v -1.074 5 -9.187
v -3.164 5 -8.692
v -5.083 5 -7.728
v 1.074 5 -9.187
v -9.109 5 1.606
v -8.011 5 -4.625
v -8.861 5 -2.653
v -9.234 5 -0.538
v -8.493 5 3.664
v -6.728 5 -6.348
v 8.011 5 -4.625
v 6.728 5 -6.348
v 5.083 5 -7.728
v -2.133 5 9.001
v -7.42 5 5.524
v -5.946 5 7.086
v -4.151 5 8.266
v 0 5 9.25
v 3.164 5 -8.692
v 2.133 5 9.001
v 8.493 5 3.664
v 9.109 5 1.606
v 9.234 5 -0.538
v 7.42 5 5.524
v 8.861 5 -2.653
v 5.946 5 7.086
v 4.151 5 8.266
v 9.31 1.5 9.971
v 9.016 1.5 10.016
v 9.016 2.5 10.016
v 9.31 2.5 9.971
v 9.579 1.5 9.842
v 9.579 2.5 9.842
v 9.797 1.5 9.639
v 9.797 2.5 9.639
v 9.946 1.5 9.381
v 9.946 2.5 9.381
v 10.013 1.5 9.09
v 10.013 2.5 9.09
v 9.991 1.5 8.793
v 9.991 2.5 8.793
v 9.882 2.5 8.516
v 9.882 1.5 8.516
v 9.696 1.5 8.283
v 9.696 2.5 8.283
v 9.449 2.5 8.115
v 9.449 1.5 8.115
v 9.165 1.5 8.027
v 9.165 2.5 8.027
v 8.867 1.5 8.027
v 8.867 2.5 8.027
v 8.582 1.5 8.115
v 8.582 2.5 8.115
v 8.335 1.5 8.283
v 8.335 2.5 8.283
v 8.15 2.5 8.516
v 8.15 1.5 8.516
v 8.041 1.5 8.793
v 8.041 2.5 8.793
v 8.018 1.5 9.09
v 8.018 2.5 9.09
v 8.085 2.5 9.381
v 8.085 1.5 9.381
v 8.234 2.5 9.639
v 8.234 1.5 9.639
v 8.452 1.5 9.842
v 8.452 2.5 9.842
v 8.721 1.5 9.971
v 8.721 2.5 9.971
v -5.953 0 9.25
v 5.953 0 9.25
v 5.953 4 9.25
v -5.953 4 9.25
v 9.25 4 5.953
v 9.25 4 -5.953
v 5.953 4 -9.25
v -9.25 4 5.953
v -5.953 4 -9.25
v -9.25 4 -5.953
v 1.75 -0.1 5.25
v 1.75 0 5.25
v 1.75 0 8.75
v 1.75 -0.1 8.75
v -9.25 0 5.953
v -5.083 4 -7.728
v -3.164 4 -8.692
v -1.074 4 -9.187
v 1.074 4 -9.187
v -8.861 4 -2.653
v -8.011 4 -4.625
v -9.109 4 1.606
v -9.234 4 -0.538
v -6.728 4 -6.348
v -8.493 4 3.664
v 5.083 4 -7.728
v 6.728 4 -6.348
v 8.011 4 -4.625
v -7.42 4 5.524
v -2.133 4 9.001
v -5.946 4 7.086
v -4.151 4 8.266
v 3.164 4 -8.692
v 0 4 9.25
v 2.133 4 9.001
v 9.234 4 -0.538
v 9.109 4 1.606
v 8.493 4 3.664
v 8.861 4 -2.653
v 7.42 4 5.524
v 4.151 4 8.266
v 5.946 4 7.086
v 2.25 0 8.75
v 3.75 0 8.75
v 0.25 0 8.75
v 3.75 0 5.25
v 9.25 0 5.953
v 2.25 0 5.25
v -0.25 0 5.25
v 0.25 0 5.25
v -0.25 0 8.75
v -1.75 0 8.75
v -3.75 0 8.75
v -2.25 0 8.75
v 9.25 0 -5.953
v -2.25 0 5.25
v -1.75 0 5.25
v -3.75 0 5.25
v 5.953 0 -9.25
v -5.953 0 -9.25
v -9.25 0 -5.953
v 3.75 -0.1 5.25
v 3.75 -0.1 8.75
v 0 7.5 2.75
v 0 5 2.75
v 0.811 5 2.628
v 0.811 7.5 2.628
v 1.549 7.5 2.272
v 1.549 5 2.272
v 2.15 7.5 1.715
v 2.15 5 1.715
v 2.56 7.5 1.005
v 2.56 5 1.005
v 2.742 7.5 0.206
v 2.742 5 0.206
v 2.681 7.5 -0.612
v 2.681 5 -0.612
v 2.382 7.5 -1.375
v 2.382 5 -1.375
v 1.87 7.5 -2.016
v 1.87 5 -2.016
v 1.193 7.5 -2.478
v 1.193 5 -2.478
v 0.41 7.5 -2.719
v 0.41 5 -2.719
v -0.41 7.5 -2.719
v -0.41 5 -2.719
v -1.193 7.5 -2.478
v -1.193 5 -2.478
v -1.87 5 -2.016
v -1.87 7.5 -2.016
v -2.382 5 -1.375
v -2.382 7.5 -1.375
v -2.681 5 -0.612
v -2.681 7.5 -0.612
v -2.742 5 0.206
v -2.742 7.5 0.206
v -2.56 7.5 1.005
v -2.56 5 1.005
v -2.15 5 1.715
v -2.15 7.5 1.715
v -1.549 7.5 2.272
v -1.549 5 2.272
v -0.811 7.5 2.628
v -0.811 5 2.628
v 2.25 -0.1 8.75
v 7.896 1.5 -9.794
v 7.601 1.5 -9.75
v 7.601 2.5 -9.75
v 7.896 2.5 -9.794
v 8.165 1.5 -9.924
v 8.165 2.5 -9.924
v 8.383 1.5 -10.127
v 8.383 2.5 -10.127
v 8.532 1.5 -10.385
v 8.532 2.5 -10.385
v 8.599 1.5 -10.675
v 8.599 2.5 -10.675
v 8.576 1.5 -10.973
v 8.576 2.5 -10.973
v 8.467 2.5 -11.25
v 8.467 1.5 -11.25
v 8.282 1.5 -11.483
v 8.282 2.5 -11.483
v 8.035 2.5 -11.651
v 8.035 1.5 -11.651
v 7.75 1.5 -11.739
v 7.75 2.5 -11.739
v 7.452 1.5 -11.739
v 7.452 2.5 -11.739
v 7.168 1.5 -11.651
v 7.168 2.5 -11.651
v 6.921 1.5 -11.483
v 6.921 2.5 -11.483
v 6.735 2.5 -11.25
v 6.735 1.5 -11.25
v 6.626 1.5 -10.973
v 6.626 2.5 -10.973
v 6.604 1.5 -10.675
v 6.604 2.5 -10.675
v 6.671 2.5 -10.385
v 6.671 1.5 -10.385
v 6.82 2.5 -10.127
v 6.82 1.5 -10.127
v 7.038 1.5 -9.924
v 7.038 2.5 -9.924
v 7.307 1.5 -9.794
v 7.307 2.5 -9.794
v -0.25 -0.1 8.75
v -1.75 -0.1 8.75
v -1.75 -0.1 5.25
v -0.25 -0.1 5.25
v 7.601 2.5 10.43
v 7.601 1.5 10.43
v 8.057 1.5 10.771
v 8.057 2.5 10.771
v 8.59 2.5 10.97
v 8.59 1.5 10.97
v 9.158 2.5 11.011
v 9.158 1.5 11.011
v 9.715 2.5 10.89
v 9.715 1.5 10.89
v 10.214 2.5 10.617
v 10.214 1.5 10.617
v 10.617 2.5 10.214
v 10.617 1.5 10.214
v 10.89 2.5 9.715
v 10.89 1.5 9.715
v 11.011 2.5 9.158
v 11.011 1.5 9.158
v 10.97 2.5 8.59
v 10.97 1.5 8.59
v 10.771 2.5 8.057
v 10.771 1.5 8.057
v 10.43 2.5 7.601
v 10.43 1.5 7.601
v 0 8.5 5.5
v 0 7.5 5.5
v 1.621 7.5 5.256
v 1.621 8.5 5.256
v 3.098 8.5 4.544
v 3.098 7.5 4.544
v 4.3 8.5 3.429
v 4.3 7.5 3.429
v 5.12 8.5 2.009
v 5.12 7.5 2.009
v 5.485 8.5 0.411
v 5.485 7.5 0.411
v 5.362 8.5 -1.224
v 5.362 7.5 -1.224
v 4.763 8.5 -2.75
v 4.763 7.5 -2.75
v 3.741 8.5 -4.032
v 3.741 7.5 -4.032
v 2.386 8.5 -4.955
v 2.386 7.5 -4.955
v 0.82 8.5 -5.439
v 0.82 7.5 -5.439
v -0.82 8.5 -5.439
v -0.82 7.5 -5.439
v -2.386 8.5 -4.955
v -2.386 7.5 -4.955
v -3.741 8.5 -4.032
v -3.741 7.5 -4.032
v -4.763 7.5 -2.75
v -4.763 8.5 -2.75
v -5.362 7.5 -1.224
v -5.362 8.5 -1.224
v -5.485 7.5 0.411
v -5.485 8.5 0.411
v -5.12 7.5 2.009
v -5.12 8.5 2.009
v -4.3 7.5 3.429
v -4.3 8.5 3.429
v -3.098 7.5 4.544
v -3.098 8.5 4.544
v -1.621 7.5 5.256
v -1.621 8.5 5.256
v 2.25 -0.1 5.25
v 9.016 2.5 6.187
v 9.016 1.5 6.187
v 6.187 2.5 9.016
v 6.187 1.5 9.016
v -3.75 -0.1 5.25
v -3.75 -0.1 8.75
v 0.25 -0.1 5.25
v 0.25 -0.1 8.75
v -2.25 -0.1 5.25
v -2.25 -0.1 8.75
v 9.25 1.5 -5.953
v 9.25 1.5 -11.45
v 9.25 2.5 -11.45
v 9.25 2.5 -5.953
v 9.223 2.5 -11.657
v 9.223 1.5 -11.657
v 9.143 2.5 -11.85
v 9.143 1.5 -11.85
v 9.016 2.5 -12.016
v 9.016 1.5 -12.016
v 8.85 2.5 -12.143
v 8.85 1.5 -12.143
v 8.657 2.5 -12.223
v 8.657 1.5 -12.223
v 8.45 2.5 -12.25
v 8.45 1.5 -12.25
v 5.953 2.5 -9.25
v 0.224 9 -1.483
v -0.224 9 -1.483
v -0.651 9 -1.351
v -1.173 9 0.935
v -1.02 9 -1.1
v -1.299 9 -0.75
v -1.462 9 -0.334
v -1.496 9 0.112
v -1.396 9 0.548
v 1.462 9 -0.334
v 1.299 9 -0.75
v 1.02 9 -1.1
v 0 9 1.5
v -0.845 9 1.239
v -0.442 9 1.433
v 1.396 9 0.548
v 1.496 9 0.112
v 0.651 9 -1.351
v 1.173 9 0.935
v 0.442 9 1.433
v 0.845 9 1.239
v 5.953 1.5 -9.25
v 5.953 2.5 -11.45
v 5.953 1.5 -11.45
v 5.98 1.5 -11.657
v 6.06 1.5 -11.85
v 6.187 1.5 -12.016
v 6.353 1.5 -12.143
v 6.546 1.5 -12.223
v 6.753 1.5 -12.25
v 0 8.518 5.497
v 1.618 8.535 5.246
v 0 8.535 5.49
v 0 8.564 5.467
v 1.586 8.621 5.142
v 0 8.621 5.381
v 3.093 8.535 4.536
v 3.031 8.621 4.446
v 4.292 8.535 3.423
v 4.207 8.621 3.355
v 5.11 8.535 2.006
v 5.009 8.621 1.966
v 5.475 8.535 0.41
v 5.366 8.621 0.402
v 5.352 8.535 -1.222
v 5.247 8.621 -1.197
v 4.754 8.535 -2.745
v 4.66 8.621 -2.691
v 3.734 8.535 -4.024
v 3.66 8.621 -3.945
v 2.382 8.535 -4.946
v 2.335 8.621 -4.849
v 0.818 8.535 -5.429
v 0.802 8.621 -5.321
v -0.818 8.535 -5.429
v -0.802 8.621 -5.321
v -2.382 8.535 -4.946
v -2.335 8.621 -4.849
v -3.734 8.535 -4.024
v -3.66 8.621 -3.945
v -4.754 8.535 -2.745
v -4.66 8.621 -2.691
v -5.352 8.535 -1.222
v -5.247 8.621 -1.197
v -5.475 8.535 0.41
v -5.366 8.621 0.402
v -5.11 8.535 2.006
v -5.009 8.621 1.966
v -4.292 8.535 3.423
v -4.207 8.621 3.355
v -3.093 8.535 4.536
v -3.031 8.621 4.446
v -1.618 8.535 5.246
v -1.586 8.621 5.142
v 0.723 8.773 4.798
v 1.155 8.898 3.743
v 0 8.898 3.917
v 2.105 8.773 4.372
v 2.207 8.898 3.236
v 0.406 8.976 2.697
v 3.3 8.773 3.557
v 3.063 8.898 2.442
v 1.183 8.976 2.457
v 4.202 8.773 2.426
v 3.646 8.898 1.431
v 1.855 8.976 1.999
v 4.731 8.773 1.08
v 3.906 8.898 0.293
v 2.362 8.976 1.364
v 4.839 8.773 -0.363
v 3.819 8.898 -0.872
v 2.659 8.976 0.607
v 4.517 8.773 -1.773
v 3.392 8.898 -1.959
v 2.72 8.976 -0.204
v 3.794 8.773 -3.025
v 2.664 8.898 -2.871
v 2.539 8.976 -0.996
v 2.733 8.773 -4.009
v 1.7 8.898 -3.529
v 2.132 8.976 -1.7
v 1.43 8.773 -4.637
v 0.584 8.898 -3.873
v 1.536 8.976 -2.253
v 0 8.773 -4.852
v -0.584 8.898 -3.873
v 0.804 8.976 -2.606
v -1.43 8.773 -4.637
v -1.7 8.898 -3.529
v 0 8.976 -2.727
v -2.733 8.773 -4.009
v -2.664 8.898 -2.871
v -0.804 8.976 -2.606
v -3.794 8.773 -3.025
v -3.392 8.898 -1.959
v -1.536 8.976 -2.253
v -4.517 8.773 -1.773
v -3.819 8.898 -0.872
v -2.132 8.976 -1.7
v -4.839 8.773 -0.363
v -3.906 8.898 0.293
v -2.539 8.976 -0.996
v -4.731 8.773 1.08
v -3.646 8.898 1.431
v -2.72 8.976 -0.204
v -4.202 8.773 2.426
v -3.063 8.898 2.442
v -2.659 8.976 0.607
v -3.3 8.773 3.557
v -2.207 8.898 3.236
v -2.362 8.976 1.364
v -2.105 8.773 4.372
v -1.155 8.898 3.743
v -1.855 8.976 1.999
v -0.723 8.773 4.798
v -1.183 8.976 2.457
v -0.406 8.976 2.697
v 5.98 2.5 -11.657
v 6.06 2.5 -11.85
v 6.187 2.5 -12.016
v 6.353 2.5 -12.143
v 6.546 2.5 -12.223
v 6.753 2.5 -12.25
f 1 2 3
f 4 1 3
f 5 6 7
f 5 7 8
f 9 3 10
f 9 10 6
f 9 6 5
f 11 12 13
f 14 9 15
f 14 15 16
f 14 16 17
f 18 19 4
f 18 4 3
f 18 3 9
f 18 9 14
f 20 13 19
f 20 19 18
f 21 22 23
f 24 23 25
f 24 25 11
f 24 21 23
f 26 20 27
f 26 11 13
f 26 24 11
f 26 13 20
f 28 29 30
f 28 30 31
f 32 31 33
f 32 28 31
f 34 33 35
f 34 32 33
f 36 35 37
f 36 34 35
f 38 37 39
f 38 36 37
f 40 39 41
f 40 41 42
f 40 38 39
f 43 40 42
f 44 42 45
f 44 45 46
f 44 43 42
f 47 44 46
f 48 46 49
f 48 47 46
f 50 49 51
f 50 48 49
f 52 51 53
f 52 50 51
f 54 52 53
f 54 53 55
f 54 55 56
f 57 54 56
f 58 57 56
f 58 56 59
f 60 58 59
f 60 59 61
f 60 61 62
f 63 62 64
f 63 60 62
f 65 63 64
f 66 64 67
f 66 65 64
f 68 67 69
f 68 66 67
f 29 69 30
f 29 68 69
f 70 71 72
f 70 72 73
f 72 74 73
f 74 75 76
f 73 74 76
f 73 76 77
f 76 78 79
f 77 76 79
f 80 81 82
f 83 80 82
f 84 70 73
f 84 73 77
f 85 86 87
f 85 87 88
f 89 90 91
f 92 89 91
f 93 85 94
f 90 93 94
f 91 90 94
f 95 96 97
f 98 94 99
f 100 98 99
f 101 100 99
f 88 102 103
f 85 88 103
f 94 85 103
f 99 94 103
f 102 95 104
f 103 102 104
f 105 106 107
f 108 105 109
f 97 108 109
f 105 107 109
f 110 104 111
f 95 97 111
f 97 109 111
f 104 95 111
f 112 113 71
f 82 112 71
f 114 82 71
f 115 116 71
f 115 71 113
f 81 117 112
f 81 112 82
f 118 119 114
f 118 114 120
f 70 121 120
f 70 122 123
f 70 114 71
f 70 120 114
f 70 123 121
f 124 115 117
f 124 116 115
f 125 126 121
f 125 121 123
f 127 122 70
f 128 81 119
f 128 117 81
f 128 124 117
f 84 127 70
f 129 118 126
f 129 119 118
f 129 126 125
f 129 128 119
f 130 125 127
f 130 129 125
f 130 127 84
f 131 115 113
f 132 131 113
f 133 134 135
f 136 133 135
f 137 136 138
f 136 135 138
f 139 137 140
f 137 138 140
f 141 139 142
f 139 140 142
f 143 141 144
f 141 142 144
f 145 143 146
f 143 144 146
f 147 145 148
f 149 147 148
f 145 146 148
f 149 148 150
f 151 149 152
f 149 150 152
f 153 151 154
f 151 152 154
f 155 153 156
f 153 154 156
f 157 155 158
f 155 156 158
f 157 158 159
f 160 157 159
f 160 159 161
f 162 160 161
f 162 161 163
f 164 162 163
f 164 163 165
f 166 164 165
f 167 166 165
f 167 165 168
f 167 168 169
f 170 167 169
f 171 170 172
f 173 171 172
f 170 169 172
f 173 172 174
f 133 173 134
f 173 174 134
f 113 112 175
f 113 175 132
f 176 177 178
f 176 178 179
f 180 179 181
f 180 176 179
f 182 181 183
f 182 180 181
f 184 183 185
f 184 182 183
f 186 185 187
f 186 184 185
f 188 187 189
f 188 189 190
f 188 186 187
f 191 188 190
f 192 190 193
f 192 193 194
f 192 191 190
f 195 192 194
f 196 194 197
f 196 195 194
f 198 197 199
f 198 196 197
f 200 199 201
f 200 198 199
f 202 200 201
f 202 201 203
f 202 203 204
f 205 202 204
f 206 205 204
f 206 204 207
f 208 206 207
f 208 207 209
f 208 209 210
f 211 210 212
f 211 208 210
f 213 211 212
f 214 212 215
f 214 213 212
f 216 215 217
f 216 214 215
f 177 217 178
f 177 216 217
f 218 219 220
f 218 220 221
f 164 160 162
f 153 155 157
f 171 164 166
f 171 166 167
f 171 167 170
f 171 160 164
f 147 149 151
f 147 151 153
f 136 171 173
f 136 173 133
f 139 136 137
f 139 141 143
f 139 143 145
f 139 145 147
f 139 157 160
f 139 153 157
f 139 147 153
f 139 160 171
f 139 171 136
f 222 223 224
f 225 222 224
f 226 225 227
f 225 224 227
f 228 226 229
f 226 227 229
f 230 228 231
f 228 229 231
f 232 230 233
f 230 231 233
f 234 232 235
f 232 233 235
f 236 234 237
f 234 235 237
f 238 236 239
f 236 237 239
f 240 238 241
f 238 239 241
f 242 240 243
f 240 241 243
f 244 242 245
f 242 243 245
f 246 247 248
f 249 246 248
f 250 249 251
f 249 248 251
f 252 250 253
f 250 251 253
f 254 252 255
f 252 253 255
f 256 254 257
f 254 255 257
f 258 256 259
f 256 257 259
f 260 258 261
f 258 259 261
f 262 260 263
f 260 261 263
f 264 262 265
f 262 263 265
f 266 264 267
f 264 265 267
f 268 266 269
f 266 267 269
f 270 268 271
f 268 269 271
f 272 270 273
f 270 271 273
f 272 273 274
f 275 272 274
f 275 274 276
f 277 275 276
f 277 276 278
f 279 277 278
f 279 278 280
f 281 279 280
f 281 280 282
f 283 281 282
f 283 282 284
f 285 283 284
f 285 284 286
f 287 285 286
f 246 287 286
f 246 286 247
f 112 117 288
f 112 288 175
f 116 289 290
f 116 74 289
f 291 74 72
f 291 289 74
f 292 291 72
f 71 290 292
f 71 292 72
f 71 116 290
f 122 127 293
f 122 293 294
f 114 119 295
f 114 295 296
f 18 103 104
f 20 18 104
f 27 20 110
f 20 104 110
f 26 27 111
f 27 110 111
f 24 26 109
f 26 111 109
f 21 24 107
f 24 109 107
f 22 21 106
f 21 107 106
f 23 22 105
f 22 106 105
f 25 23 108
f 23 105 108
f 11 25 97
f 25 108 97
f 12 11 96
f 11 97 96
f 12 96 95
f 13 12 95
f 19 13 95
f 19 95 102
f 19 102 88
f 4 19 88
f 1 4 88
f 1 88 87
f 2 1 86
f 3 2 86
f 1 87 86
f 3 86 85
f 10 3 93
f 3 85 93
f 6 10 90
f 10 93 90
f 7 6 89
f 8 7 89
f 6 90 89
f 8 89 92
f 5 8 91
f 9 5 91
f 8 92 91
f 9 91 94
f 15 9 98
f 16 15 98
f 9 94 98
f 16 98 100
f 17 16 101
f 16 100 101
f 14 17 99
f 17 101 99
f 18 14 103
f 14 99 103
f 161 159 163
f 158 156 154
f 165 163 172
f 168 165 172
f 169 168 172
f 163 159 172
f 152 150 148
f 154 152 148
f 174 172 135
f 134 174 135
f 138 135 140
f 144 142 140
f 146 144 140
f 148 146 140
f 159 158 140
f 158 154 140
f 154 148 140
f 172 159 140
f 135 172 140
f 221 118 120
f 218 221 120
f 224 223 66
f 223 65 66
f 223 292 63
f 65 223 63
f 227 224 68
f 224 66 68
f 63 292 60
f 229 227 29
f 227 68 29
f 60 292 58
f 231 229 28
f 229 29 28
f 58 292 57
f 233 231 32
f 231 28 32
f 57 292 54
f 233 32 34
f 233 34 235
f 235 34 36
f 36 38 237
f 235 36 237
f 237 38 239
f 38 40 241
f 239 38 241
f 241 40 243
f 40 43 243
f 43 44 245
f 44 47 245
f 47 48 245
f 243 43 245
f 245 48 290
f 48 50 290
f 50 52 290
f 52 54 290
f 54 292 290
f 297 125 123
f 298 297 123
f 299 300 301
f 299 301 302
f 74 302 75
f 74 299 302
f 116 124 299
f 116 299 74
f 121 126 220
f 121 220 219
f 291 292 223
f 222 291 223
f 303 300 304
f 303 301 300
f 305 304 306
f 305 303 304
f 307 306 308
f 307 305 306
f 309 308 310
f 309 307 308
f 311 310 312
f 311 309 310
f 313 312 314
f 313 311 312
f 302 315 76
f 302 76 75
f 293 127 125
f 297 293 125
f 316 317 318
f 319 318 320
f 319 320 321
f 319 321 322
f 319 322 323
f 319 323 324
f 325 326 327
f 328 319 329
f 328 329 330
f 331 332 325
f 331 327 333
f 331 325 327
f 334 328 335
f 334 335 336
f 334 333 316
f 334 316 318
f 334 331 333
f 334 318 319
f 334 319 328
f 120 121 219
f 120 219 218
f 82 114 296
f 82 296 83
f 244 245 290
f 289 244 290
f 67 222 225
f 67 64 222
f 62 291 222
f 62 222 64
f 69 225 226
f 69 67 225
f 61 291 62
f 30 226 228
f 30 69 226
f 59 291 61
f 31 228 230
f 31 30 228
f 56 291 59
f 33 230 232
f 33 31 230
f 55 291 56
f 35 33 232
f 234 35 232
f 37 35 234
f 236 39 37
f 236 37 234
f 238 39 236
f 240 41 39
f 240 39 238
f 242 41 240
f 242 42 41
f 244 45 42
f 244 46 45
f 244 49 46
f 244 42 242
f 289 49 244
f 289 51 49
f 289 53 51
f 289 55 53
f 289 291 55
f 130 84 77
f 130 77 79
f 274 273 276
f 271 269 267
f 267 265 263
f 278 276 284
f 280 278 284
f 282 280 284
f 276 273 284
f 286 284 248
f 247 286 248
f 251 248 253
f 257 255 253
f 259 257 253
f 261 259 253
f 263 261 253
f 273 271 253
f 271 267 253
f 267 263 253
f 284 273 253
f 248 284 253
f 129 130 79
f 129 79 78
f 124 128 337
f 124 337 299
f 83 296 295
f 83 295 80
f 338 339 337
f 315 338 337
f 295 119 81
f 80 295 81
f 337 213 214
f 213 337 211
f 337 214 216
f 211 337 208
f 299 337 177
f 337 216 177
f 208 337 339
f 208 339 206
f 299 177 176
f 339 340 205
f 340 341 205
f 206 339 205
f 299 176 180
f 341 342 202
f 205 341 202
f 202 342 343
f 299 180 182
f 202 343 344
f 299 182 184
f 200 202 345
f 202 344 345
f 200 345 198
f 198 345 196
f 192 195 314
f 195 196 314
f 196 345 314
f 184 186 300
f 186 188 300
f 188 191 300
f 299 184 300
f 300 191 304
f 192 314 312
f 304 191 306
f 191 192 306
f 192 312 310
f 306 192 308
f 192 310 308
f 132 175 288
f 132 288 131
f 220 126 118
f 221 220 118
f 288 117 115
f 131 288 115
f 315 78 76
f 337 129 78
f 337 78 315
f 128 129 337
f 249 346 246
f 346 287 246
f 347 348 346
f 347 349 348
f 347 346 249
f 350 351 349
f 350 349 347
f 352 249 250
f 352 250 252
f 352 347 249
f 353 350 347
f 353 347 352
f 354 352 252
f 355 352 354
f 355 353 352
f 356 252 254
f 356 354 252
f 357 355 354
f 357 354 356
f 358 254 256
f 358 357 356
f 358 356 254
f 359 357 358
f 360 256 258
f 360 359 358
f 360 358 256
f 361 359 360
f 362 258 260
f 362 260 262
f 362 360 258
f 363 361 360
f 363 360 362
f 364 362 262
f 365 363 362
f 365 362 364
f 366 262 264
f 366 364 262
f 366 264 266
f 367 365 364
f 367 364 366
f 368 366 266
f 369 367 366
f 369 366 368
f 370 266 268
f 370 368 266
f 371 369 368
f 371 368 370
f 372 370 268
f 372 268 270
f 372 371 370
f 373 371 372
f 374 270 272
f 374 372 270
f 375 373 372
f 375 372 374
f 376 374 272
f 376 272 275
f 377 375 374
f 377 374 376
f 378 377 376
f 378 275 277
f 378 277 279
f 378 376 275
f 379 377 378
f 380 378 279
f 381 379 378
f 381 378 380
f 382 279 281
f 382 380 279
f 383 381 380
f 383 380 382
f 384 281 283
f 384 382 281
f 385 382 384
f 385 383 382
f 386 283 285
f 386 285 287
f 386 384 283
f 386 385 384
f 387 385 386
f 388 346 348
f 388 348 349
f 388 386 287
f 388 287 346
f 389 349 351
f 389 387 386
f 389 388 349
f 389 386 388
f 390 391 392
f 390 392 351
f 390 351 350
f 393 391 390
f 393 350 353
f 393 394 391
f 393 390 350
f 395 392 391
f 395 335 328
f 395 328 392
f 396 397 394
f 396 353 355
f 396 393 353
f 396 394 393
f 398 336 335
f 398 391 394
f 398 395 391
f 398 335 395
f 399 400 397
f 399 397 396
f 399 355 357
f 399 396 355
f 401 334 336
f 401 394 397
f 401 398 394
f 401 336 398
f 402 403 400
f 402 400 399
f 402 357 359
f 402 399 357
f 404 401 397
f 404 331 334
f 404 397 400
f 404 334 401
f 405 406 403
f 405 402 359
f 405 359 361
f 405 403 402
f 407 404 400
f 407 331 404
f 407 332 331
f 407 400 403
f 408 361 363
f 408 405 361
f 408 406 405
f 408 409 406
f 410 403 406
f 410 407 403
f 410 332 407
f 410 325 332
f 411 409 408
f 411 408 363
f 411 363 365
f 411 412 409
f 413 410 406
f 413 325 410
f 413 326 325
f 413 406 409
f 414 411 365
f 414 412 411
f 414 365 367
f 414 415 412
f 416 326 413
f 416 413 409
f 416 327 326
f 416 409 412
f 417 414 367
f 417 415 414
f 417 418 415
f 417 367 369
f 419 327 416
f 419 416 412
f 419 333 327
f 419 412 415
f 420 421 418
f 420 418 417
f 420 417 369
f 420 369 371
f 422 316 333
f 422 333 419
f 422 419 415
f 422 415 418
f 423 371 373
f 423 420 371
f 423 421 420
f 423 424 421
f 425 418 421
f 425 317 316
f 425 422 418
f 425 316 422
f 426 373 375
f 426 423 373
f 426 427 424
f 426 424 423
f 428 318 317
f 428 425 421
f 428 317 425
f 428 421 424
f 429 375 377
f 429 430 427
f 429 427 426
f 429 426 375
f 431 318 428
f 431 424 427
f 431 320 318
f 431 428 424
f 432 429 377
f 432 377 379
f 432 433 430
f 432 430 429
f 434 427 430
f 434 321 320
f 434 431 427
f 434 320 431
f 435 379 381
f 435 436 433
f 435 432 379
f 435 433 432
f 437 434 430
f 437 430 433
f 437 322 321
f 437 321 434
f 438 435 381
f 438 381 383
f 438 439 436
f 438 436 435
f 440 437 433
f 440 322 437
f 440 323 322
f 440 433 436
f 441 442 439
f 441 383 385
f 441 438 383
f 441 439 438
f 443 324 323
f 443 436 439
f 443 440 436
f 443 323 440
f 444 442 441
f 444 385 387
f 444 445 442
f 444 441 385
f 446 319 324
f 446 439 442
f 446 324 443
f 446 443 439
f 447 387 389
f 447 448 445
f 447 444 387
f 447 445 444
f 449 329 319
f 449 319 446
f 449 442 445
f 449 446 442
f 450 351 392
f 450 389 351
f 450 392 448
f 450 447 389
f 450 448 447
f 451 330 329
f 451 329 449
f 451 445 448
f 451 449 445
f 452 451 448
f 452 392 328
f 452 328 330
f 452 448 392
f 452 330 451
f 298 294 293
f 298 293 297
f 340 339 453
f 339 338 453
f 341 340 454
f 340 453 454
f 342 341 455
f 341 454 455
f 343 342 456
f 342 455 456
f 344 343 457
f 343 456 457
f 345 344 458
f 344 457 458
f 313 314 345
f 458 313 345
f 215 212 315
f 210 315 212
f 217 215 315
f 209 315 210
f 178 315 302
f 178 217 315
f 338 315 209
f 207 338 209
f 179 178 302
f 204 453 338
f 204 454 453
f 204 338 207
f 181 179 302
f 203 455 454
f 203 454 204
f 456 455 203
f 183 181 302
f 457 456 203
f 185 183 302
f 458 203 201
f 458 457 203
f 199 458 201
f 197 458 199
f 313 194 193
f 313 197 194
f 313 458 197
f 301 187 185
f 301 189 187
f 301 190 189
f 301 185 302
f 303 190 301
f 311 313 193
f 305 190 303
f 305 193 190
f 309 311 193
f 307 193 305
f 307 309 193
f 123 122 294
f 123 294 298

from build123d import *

# Parameters (mm, degrees)
BOSS_EXTRUDE1_DEPTH = 4
SKETCH2_R           = 9.25
BOSS_EXTRUDE2_DEPTH = 1
SKETCH4_R           = 1
BOSS_EXTRUDE3_DEPTH = 1
SKETCH5_R           = 2.75
BOSS_EXTRUDE4_DEPTH = 2.5
SKETCH6_R           = 5.5
BOSS_EXTRUDE5_DEPTH = 1.5
FILLET1_SIZE        = 0.5
FILLET1_SIZE_2      = 4
FILLET2_R           = 0.8
SKETCH7_W           = 1.5
SKETCH7_H           = 3.5
BOSS_EXTRUDE6_DEPTH = 0.1


with BuildPart() as part:
    # Sketch1 → Boss-Extrude1 (new body)
    with BuildSketch(Plane(origin=(0, 0, 0), x_dir=(1, 0, 0), z_dir=(0, 1, 0))):
        Polygon((-5.952795796, 9.25), (5.952795796, 9.25), (9.25, 5.952795796), (9.25, -5.952795796), (5.952795796, -9.25), (-5.952795796, -9.25), (-9.25, -5.952795796), (-9.25, 5.952795796), align=None)
    extrude(amount=BOSS_EXTRUDE1_DEPTH)

    # Sketch4 → Boss-Extrude3 (add)
    # profile 1 of 2: a face of its own
    with BuildSketch(Plane(origin=(0, 1.5, 0), x_dir=(1, 0, 0), z_dir=(0, 1, 0))):
        Polygon((9.25, 5.952795796), (9.25, 12.25), (5.952795796, 12.25), (5.952795796, 9.25), align=None)
        with Locations(Location((7.601397898, 10.75, 0), (0, 0, 270))):
            Circle(SKETCH4_R, mode=Mode.SUBTRACT)
    # profile 2 of 2: a face of its own
    with BuildSketch(Plane(origin=(0, 1.5, 0), x_dir=(1, 0, 0), z_dir=(0, 1, 0))):
        with BuildLine():
            Line((6.187184335, -9.01561146), (7.601397898, -10.429825023))
            ThreePointArc((7.601397898, -10.429825023), (10.429825023, -10.429825023), (10.429825023, -7.601397898))
            Line((10.429825023, -7.601397898), (9.01561146, -6.187184335))
            Line((9.01561146, -6.187184335), (6.187184335, -9.01561146))
        make_face()
        with Locations(Location((9.01561146, -9.01561146, 0), (0, 0, 270))):
            Circle(SKETCH4_R, mode=Mode.SUBTRACT)
    extrude(amount=BOSS_EXTRUDE3_DEPTH)

    # Fillet2
    fillet2_edges = [part.edges().sort_by_distance(p)[0] for p in [
        (9.25, 2, -12.25),
        (5.952795796, 2, -12.25),
    ]]
    fillet(fillet2_edges, radius=FILLET2_R)

    # Sketch7 → Boss-Extrude6 (add)
    with BuildSketch(Plane.XZ):
        with Locations((-3, 7)):
            Rectangle(SKETCH7_W, SKETCH7_H)
        with Locations((-1, 7)):
            Rectangle(SKETCH7_W, SKETCH7_H)
        with Locations((1, 7)):
            Rectangle(SKETCH7_W, SKETCH7_H)
        with Locations((3, 7)):
            Rectangle(SKETCH7_W, SKETCH7_H)
    extrude(amount=BOSS_EXTRUDE6_DEPTH)


with BuildPart() as body_2:
    # Sketch2 → Boss-Extrude2 (new body)
    with BuildSketch(Plane(origin=(0, 4, 0), x_dir=(1, 0, 0), z_dir=(0, 1, 0))):
        with Locations(Location((0, 0, 0), (0, 0, 270))):
            Circle(SKETCH2_R)
    extrude(amount=BOSS_EXTRUDE2_DEPTH)


with BuildPart() as body_3:
    # Sketch5 → Boss-Extrude4 (new body)
    with BuildSketch(Plane(origin=(0, 5, 0), x_dir=(1, 0, 0), z_dir=(0, 1, 0))):
        with Locations(Location((0, 0, 0), (0, 0, 270))):
            Circle(SKETCH5_R)
    extrude(amount=BOSS_EXTRUDE4_DEPTH)


with BuildPart() as body_4:
    # Sketch6 → Boss-Extrude5 (new body)
    with BuildSketch(Plane(origin=(0, 7.5, 0), x_dir=(1, 0, 0), z_dir=(0, 1, 0))):
        with Locations(Location((0, 0, 0), (0, 0, 270))):
            Circle(SKETCH6_R)
    extrude(amount=BOSS_EXTRUDE5_DEPTH)

    # Fillet1
    # an asymmetric fillet: 4, 0.5 mm, written as the material it takes off along each edge
    with BuildSketch(Plane(origin=(0, 9, 0), x_dir=(0, 0, 1), z_dir=(-1, 0, 0))) as fillet1_piece_1:
        with BuildLine():
            Bezier((5.5, -FILLET1_SIZE), (5.5, 0), (5.5 - FILLET1_SIZE_2, 0), weights=[1, 0.707106781, 1])
            Line((5.5 - FILLET1_SIZE_2, 0), (5.5, 0))
            Line((5.5, 0), (5.5, -FILLET1_SIZE))
        make_face()
    revolve(axis=Axis((0, 9, 0), (0, 1, 0)), mode=Mode.SUBTRACT)


solid = Compound([part.part, body_2.part, body_3.part, body_4.part])
